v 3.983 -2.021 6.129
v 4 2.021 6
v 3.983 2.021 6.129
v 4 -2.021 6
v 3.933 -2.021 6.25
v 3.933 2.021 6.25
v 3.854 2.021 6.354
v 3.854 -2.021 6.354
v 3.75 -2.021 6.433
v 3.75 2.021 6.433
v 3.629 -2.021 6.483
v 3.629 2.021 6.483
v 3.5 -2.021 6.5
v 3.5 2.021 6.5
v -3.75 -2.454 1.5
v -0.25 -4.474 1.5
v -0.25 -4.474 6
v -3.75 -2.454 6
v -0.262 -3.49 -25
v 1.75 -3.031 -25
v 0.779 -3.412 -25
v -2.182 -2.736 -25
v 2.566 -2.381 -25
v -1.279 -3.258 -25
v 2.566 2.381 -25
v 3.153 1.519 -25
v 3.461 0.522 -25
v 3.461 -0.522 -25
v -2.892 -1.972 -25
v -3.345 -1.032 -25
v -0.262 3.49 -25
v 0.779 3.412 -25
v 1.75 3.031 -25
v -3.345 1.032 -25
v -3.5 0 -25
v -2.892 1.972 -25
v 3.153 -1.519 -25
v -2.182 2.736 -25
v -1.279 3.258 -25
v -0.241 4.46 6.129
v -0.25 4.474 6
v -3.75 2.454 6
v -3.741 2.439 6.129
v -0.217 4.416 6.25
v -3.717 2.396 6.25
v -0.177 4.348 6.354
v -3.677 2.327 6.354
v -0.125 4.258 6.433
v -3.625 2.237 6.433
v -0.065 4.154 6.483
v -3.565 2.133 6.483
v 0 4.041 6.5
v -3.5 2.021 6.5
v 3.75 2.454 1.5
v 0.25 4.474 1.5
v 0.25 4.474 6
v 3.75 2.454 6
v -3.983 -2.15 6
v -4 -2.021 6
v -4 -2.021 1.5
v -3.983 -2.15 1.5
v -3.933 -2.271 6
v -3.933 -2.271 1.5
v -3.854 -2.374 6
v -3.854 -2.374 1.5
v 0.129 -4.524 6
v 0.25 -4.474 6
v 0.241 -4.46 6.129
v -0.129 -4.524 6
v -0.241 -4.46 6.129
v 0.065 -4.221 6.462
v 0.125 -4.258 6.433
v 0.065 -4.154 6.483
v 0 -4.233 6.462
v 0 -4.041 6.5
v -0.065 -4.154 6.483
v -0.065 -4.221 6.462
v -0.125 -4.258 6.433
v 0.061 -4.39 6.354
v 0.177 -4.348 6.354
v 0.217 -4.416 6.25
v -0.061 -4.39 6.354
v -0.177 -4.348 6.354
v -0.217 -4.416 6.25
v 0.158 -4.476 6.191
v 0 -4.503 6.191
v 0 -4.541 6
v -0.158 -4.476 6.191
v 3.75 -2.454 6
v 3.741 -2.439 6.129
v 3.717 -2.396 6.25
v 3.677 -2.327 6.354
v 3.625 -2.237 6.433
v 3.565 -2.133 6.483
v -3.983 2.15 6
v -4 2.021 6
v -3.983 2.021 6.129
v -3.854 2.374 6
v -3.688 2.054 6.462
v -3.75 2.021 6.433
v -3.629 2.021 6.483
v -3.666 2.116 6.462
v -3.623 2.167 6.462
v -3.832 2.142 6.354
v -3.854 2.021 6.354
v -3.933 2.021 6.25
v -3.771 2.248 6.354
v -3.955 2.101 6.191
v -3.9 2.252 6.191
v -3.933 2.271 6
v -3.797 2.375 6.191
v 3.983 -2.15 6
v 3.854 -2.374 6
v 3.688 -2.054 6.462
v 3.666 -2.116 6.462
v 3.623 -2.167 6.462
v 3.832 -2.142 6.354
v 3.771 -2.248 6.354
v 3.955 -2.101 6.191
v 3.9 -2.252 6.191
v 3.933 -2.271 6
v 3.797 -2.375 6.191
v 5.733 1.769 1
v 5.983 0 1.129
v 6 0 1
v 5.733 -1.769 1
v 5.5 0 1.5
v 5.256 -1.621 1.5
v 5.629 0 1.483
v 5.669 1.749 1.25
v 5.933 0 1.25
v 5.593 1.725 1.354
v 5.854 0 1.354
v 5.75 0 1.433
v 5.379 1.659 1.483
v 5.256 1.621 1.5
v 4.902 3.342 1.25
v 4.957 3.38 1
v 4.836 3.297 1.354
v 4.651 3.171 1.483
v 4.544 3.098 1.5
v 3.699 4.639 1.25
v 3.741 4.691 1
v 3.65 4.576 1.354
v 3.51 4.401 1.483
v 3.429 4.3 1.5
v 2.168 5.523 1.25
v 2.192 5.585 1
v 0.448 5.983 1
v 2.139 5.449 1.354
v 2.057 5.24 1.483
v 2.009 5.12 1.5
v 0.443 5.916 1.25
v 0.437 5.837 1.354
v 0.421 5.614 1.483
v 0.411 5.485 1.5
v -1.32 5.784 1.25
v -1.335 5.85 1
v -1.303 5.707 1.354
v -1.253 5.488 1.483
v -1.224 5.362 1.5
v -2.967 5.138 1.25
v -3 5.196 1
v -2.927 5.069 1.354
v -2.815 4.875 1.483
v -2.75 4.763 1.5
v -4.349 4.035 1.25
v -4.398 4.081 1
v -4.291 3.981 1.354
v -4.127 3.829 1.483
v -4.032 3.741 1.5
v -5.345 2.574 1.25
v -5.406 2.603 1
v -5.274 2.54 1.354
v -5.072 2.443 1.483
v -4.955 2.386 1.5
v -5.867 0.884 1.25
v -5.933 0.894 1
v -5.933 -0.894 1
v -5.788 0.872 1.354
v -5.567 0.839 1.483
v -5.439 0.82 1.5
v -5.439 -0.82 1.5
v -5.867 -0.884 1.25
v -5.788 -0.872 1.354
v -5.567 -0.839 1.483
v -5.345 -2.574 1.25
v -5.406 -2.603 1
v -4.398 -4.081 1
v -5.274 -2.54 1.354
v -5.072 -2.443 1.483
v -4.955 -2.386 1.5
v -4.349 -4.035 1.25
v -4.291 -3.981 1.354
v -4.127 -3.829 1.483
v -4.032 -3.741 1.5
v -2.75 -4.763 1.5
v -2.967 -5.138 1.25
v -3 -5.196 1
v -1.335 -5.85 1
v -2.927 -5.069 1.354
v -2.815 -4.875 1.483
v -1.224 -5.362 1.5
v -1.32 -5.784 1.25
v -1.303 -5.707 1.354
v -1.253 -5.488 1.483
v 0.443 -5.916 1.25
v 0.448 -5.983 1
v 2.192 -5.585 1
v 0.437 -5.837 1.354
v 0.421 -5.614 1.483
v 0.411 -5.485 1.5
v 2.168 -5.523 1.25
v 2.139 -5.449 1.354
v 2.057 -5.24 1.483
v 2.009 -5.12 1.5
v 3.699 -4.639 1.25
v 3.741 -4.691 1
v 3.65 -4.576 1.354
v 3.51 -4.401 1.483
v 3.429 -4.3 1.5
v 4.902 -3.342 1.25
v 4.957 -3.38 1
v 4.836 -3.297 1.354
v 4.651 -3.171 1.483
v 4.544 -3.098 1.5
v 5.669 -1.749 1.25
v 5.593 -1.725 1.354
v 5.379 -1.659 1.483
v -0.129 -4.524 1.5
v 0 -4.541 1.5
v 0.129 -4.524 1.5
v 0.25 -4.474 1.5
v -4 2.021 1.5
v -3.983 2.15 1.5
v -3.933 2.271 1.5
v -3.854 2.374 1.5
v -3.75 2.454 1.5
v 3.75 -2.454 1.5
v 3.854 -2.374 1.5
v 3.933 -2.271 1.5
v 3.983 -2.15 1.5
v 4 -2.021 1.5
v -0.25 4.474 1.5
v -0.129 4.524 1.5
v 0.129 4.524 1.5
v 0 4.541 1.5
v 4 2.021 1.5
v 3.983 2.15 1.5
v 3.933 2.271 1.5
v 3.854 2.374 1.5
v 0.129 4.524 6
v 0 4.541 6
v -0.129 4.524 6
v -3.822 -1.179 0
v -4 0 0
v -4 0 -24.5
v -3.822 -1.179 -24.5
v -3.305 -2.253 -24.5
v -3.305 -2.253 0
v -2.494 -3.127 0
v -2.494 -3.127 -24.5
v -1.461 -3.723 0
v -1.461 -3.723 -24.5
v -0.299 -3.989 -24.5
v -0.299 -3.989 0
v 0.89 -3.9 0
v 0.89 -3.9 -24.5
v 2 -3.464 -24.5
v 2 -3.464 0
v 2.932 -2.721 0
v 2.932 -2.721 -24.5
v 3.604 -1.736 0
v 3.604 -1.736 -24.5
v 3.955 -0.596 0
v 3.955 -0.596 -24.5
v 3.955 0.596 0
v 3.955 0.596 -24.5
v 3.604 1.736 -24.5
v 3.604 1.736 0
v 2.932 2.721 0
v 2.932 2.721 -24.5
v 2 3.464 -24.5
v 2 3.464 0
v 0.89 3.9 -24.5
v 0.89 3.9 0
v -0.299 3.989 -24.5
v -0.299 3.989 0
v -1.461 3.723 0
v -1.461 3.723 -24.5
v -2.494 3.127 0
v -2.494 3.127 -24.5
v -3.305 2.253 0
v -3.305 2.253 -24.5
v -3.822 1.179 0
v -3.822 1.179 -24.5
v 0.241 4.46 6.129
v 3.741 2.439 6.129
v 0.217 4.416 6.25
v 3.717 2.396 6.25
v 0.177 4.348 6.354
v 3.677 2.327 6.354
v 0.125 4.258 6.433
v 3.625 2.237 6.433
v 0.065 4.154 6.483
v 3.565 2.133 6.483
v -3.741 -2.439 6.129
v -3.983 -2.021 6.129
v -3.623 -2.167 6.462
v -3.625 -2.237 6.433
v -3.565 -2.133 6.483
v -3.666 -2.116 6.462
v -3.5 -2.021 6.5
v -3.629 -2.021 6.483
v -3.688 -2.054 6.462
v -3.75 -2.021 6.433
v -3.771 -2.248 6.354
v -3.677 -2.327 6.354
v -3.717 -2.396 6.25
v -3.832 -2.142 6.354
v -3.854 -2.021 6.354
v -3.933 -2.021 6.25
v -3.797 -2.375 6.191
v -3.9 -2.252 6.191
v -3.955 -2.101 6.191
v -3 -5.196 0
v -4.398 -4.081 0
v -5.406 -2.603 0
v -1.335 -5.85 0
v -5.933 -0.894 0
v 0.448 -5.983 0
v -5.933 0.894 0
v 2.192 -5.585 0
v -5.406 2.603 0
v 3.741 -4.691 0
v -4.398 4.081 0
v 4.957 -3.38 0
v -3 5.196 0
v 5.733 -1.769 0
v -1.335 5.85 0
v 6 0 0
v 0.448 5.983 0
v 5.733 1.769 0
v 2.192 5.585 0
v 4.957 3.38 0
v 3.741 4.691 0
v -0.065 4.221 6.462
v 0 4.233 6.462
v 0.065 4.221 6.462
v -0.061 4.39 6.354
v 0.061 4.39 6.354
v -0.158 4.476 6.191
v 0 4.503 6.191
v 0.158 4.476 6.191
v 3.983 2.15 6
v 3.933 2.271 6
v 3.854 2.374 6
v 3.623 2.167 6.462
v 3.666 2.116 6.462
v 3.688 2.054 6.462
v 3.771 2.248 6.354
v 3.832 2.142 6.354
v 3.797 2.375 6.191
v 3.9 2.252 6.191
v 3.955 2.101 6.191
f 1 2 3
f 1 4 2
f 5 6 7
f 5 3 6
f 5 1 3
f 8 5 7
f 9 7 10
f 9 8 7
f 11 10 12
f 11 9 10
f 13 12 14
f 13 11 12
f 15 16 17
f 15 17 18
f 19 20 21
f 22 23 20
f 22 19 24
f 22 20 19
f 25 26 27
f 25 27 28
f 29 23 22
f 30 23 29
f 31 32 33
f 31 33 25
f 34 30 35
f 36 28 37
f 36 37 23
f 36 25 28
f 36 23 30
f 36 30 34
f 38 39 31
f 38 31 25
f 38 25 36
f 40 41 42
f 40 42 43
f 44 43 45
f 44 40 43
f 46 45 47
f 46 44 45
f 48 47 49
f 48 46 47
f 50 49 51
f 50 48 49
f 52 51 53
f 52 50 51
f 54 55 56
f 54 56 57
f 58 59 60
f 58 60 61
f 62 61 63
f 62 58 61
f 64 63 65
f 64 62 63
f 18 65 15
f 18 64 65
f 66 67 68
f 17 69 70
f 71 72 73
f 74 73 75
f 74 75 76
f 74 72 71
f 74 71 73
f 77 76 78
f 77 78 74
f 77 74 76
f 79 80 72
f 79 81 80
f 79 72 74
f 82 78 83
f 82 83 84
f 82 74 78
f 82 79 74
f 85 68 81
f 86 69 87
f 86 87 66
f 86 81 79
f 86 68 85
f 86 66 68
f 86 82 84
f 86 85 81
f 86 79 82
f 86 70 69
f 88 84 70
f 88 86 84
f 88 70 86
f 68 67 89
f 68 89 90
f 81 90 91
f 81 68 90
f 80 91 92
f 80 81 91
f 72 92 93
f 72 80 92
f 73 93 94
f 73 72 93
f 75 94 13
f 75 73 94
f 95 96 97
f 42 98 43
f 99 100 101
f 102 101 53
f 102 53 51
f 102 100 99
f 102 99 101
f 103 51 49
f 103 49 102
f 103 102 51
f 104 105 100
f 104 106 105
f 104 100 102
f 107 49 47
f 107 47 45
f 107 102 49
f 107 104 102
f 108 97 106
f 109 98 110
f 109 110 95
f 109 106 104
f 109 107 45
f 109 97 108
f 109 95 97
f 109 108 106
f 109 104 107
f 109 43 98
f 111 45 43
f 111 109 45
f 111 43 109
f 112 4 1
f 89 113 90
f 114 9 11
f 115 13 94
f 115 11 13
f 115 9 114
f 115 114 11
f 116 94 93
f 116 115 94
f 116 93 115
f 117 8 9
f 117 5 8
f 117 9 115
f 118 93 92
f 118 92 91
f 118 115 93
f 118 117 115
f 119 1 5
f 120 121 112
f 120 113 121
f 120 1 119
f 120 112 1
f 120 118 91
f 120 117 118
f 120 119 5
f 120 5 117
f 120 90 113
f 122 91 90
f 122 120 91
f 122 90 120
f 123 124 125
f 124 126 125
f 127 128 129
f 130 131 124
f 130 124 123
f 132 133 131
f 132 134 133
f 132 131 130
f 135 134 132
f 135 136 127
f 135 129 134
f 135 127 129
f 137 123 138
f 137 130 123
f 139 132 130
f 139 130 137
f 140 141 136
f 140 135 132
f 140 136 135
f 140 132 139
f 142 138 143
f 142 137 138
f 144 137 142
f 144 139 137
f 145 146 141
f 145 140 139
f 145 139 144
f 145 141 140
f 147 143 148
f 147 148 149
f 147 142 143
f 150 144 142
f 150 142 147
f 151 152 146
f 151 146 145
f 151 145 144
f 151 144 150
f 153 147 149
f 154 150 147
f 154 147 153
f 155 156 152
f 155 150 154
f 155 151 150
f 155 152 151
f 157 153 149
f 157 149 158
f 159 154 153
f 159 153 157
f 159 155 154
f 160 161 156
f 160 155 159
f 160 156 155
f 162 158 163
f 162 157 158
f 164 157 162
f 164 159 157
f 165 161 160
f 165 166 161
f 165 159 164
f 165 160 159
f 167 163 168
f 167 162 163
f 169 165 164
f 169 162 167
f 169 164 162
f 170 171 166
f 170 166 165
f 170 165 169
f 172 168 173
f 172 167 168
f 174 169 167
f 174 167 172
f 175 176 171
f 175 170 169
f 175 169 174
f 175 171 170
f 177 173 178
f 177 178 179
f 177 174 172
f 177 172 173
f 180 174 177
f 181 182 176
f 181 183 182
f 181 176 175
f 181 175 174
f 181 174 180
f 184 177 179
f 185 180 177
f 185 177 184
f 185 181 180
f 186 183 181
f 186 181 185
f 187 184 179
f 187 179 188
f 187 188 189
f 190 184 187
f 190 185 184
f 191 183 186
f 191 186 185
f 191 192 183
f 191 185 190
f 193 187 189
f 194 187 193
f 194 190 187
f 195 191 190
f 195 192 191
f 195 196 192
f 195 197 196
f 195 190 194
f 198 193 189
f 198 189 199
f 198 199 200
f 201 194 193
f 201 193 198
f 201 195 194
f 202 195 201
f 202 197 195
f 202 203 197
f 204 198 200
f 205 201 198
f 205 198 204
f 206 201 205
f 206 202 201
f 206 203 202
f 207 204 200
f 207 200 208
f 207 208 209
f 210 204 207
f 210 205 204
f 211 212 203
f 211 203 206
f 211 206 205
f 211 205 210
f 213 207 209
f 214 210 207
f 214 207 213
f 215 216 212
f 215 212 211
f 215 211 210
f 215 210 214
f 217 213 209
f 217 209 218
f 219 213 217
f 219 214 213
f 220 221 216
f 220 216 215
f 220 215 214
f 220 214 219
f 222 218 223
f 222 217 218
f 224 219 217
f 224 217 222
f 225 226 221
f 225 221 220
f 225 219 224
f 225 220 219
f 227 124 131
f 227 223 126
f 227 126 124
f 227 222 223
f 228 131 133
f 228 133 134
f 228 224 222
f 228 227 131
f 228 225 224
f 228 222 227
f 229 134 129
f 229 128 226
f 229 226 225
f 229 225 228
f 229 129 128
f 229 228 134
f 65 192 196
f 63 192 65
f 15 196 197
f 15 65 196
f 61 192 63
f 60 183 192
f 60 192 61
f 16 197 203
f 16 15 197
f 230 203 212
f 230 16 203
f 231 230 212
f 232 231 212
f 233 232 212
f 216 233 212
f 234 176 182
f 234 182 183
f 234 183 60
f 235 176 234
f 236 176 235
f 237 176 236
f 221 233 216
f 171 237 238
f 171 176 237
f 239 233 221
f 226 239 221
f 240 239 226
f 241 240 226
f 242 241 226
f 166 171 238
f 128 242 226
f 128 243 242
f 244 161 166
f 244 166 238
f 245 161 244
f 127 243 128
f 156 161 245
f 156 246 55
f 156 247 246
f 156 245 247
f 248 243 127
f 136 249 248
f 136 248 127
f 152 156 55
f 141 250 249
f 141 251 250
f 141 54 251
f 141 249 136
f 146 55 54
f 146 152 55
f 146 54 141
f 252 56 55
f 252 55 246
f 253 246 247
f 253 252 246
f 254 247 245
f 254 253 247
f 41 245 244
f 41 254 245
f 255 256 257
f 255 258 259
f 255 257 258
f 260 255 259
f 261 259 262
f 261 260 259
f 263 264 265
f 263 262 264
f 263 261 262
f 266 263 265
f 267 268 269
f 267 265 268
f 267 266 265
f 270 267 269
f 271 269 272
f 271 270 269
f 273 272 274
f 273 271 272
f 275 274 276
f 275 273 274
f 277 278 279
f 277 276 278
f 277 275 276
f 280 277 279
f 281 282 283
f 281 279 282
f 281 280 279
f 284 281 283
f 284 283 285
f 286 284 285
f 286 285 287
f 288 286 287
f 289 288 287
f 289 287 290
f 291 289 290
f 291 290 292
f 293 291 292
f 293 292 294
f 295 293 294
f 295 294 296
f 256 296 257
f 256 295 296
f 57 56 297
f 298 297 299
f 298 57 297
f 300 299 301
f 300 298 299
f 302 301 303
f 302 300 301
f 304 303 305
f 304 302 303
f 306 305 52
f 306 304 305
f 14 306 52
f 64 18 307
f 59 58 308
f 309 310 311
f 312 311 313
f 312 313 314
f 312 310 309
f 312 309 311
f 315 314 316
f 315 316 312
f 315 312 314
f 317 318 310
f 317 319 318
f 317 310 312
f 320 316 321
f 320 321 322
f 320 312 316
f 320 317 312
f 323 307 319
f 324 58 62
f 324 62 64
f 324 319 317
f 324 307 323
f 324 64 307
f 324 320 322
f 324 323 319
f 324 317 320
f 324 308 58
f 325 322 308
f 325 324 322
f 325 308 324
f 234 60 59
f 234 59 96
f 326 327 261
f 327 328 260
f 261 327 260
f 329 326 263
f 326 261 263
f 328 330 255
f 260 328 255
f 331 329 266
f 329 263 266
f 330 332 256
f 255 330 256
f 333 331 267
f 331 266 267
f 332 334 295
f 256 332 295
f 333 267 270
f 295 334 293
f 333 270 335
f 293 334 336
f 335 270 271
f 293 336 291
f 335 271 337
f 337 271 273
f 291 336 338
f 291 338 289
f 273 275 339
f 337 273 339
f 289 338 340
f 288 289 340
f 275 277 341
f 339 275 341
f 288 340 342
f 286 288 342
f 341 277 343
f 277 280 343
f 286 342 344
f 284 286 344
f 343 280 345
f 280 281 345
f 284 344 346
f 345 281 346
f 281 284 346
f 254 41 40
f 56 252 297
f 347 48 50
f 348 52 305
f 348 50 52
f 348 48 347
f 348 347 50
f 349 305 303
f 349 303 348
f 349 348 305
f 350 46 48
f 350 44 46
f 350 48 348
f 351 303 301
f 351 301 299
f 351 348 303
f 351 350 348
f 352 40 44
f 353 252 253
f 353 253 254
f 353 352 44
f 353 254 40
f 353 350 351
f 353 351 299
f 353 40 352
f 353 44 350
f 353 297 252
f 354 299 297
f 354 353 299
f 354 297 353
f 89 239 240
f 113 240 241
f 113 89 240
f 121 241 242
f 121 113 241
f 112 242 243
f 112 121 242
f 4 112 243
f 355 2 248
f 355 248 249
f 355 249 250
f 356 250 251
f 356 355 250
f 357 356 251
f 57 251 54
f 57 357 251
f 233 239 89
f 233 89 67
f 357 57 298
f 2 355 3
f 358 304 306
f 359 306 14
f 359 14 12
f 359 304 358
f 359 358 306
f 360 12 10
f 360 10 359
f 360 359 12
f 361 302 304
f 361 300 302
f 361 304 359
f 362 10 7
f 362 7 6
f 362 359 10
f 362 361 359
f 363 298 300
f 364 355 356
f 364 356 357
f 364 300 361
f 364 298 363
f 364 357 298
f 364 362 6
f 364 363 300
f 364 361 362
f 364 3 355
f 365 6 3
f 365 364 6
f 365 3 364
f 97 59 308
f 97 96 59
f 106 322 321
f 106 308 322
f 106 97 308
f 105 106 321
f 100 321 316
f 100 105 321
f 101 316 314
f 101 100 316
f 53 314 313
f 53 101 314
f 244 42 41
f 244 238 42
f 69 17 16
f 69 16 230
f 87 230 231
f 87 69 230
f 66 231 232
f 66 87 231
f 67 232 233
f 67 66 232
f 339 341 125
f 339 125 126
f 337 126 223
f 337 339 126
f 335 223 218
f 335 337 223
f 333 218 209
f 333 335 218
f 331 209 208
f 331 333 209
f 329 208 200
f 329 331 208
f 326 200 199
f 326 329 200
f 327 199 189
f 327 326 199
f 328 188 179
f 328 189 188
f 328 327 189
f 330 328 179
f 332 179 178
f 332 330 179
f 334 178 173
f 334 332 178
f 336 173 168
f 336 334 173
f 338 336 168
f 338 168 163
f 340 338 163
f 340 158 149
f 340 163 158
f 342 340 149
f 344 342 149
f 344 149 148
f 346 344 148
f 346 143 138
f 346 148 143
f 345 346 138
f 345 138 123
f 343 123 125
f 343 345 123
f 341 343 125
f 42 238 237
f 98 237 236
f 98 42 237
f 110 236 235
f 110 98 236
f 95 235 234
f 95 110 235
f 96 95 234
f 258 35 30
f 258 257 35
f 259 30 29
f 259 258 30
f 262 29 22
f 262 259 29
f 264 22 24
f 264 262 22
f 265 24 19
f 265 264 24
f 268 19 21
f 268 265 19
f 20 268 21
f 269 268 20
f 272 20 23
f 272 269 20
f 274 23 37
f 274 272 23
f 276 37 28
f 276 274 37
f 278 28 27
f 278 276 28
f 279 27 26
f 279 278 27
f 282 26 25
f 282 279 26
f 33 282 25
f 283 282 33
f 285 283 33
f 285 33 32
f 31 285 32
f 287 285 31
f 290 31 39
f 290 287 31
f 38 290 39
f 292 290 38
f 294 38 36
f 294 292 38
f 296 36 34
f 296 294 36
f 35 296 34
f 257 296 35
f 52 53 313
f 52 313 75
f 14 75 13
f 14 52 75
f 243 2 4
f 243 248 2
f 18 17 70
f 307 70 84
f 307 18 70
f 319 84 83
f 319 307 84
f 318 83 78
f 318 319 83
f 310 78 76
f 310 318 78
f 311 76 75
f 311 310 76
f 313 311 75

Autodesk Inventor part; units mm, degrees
ref_plane "YZ Plane" through (0, 0, 0) normal (1, 0, 0) x (0, 1, 0)
ref_plane "XZ Plane" through (0, 0, 0) normal (0, 1, 0) x (-1, 0, 0)
ref_plane "XY Plane" through (0, 0, 0) normal (0, 0, 1) x (1, 0, 0)
sketch "草图1" plane through (0, 0, 0) normal (0, 0, 1) x (1, 0, 0)
  circle A0 centre (0, 0) radius 6
  dimension "d0" = 12
extrude "拉伸1" add sketch "草图1" along normal blind 1.5
sketch "草图2" plane through (0, 0, 1.5) normal (0, 0, 1) x (1, 0, 0)
  line L0 (0, -4.6188) -> (-4, -2.3094)
  line L1 (-4, -2.3094) -> (-4, 2.3094)
  line L2 (-4, 2.3094) -> (0, 4.6188)
  line L3 (0, 4.6188) -> (4, 2.3094)
  line L4 (4, 2.3094) -> (4, -2.3094)
  line L5 (4, -2.3094) -> (0, -4.6188)
  line L6 (0, 0) -> (0, 2.9591)
  dimension "d3" = 8
  dimension "d4" = 2.9591
extrude "拉伸2" add sketch "草图2" along normal blind 5
sketch "草图3" plane through (0, 0, 0) normal (0, 0, -1) x (-1, 0, 0)
  circle A0 centre (0, 0) radius 4
  dimension "d7" = 8
extrude "拉伸3" add sketch "草图3" along normal blind 25
thread "螺纹1" size "M8x1.25" class "6g" standard "ANSI Metric M Profile" full length
chamfer "倒角1" distance 0.5 angle 45 1 edges at (4, 0, -25)
fillet "圆角1" radius 0.5 13 edges at (-6, 0, 1.5) (4, 0, 6.5) (2, 3.4641, 6.5) (-2, 3.4641, 6.5) (-4, 0, 6.5) (-2, -3.4641, 6.5) (2, -3.4641, 6.5) (4, 2.3094, 4) (0, 4.6188, 4) (4, -2.3094, 4) (0, -4.6188, 4) (-4, -2.3094, 4) (-4, 2.3094, 4)
properties part number "装填斗固定螺丝"
